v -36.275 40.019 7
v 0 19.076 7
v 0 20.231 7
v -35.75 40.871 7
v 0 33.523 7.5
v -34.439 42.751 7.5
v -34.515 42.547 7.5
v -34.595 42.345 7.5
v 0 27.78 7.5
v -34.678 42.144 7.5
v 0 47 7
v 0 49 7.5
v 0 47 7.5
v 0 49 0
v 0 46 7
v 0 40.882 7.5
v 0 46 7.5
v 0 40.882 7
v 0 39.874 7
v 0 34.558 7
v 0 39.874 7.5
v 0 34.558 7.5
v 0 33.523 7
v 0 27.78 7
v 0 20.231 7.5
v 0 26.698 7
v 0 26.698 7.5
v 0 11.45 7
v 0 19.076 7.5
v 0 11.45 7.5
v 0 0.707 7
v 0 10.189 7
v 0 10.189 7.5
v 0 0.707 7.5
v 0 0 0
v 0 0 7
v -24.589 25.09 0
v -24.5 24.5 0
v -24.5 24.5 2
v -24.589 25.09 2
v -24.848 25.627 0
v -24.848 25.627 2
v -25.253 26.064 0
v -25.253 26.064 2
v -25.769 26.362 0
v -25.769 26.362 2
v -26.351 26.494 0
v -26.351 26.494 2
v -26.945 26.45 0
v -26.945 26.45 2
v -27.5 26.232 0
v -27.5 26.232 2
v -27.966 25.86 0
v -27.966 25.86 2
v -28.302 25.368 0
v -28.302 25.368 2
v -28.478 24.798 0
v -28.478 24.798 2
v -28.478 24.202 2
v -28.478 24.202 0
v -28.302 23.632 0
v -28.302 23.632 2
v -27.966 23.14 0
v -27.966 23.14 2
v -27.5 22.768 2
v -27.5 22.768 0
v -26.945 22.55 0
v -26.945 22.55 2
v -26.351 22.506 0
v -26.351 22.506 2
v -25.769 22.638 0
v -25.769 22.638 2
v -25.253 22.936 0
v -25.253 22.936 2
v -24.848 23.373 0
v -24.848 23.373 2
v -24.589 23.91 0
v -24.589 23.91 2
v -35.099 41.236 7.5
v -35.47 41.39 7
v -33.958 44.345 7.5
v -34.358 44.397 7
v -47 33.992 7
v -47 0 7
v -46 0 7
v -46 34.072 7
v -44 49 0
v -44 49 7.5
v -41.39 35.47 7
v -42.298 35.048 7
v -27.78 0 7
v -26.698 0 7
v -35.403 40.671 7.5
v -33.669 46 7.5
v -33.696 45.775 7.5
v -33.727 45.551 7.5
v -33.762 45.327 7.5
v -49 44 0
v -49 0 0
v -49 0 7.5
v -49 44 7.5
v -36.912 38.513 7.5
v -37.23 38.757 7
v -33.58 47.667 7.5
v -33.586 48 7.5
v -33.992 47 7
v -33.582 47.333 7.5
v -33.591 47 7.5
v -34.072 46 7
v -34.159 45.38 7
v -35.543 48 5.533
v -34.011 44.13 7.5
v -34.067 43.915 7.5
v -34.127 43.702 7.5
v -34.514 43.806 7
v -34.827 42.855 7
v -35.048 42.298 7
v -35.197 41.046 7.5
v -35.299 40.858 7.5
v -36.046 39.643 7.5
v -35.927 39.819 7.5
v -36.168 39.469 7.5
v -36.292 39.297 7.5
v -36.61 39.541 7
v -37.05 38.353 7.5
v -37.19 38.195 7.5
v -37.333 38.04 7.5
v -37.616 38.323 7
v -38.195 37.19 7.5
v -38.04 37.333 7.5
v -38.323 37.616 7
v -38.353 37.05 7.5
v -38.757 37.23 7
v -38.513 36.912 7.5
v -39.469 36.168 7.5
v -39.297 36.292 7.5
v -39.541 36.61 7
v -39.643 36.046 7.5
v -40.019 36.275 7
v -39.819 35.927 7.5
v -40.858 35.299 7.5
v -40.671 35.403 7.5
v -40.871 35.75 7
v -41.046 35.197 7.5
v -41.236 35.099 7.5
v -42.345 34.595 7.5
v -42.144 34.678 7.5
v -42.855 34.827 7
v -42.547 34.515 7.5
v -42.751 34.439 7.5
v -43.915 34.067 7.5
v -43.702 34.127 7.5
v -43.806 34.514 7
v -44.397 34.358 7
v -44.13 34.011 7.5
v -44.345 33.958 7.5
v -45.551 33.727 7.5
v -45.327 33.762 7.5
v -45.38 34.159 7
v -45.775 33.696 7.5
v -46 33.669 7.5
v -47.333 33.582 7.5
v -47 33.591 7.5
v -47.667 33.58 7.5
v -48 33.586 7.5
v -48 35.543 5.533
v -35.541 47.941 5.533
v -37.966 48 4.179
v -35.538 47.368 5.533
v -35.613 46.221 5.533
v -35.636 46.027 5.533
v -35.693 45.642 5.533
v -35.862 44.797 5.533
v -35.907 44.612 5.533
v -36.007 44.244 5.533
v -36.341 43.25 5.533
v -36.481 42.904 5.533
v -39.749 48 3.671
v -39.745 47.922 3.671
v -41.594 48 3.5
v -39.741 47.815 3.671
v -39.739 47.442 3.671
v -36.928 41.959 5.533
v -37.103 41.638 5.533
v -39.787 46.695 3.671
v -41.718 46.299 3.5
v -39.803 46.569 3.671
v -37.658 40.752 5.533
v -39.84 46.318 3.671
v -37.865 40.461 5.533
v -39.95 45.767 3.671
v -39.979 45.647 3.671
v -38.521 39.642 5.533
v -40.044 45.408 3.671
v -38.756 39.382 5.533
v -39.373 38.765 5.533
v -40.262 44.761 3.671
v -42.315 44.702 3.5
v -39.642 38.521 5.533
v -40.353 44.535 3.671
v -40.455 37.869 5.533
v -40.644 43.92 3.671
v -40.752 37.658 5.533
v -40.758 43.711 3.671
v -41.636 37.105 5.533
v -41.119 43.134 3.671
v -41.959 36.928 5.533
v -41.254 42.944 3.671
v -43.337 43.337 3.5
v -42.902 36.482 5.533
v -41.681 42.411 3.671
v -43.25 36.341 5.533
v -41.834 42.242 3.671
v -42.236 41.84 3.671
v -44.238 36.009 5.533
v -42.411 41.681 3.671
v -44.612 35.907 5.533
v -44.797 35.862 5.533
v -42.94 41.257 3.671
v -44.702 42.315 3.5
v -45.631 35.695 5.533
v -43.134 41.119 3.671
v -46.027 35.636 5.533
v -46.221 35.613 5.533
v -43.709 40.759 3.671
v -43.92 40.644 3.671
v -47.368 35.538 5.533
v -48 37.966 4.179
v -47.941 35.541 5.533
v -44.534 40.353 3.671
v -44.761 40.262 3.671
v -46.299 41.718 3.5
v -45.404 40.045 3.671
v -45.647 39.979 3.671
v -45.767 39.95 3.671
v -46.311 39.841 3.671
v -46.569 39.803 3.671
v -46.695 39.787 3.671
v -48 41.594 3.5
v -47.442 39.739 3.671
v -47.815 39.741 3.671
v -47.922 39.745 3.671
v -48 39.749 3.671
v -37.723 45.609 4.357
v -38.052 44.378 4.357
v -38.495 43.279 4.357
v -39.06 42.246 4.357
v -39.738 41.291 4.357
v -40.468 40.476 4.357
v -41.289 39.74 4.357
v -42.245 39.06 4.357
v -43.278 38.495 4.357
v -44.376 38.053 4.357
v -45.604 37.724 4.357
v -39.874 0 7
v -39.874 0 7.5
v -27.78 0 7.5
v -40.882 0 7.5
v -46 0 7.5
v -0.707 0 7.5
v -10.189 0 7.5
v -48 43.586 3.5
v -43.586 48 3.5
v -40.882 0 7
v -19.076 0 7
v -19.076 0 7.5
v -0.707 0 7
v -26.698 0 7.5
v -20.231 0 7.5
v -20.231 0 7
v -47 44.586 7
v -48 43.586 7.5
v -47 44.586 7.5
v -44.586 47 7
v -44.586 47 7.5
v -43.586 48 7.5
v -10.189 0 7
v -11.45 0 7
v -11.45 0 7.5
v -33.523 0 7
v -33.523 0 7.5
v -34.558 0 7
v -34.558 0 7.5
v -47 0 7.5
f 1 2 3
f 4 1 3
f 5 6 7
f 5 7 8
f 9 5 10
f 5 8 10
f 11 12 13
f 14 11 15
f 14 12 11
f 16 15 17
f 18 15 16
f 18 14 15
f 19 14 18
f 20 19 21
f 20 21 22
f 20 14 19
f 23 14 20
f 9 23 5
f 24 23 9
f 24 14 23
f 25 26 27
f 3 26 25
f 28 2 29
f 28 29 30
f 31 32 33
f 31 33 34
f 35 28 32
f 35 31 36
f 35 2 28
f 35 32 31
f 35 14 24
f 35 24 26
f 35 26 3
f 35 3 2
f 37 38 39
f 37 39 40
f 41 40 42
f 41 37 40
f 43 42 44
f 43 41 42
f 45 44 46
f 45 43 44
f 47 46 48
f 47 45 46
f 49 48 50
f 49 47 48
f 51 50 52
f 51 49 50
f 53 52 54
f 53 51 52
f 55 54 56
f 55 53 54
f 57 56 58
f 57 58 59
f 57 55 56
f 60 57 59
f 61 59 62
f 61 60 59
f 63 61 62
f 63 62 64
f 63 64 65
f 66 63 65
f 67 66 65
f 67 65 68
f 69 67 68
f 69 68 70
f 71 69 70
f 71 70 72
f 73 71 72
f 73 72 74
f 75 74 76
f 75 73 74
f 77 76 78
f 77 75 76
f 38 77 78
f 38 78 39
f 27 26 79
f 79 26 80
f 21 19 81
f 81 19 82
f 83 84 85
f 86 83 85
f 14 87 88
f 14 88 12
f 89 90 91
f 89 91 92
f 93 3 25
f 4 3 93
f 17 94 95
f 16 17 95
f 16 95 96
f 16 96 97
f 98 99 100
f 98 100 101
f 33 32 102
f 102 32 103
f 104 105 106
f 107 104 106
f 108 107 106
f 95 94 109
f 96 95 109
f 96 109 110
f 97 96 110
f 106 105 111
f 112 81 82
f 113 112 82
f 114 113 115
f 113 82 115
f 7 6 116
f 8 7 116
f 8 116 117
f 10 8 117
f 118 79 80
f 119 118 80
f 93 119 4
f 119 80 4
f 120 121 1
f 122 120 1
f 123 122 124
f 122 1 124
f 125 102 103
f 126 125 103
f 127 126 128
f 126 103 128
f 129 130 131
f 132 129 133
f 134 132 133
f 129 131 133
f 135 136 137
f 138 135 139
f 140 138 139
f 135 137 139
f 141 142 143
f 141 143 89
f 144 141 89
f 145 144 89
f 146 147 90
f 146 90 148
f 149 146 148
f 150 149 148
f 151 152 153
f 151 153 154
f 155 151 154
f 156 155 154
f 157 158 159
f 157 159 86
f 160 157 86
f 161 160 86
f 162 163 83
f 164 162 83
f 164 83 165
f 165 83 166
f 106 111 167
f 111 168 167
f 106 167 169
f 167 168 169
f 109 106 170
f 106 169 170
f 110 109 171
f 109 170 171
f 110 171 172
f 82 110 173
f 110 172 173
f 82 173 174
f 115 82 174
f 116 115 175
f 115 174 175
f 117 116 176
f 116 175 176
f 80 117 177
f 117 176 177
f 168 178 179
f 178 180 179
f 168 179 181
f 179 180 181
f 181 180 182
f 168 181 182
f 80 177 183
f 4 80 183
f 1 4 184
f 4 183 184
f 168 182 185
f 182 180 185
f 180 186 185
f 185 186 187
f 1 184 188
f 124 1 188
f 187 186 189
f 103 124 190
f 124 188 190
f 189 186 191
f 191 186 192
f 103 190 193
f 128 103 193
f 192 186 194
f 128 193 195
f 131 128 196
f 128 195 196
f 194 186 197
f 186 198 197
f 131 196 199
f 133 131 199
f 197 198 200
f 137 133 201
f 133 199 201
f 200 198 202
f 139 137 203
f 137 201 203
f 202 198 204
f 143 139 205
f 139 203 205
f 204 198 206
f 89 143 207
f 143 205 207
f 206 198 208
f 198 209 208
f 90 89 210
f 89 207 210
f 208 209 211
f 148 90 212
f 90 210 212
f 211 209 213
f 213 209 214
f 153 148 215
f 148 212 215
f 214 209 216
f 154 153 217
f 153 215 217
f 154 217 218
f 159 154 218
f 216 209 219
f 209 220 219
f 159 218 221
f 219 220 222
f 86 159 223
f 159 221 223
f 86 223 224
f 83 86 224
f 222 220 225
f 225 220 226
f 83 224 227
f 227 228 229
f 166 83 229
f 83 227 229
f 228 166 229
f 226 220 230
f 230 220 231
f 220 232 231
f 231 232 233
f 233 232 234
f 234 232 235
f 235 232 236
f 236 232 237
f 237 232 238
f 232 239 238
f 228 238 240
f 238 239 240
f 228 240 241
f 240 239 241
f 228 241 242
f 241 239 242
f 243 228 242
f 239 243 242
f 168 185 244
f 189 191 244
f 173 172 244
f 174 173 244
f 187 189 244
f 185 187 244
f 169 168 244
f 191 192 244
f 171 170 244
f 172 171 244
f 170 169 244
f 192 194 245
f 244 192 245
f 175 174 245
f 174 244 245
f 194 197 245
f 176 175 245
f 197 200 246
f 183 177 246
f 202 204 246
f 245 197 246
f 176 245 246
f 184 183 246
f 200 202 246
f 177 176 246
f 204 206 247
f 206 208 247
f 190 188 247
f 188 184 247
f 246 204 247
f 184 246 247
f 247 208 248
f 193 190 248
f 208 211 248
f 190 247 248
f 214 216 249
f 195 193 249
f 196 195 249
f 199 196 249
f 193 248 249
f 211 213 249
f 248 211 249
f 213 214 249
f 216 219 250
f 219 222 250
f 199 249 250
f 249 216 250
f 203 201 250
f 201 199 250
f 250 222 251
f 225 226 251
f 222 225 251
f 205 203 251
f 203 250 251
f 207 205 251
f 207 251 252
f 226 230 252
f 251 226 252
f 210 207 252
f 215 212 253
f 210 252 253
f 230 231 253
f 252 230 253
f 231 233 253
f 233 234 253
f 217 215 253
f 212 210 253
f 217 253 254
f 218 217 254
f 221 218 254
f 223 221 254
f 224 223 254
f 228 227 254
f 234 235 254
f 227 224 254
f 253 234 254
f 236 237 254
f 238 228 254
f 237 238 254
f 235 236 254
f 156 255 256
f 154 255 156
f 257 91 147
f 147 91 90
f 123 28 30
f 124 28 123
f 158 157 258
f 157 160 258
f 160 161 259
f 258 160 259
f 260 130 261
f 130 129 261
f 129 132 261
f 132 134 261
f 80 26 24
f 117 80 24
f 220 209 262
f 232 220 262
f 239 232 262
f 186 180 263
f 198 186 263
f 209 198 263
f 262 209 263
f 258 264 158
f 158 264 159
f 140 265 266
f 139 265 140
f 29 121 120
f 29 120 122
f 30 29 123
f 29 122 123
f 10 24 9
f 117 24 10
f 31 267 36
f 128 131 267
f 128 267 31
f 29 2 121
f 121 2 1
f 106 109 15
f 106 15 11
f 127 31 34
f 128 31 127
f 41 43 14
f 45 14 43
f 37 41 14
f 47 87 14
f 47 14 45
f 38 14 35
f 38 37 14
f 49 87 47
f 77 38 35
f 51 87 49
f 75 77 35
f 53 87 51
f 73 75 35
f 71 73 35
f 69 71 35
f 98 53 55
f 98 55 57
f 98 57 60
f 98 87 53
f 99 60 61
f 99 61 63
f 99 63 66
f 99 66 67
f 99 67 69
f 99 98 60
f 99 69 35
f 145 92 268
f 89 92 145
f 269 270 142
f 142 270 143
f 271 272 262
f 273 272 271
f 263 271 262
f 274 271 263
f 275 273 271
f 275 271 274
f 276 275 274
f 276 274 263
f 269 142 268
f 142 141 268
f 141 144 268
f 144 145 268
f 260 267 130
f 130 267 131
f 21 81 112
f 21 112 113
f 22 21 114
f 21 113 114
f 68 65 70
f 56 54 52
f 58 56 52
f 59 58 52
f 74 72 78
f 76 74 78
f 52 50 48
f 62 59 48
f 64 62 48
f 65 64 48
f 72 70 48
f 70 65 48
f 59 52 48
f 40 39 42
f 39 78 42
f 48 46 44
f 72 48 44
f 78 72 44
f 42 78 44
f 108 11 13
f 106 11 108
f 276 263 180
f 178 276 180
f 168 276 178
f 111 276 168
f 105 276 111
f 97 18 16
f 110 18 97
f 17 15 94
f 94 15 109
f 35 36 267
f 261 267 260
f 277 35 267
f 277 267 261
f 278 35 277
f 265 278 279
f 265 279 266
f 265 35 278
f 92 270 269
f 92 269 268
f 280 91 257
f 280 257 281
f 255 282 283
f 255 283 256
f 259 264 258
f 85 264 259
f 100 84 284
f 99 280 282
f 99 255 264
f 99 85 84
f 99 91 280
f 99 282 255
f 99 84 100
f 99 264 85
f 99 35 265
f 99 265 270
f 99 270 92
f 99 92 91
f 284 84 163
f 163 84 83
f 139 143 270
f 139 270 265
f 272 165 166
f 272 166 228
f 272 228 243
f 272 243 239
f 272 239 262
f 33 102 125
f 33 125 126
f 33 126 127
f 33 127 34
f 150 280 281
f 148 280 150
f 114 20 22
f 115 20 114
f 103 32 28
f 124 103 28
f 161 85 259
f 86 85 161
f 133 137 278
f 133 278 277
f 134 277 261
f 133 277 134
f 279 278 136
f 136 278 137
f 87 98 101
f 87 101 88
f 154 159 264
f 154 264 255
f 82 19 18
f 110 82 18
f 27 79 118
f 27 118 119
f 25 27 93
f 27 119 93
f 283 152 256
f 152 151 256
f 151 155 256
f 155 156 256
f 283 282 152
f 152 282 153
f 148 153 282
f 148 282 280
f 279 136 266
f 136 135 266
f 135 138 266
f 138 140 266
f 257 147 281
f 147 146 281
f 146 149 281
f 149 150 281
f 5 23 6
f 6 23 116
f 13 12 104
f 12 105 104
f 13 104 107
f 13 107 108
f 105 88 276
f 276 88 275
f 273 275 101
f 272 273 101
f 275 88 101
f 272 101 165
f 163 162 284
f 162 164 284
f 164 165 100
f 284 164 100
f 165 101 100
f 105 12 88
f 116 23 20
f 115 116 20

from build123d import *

# Parameters (mm, degrees)
BOSS_EXTRUDE1_DEPTH     = 7.5
CUT_EXTRUDE1_DEPTH      = 4
FILLET1_R               = 10
CUT_EXTRUDE_THIN2_START = -0.5
SKETCH2_W               = 1
SKETCH2_H               = 80
CUT_EXTRUDE_THIN2_DEPTH = 71.201147767
CIRPATTERN1_COUNT       = 13
CIRPATTERN1_ANGLE       = 90
SKETCH5_R               = 2
CUT_EXTRUDE2_DEPTH      = 2


with BuildPart() as part:
    # Sketch1 → Boss-Extrude1 (new body)
    with BuildSketch(Plane(origin=(0, 0, 0), x_dir=(0, 1, 0), z_dir=(0, 0, 1))):
        Polygon((44, 49), (49, 44), (49, 0), (0, 0), (0, 49), align=None)
    extrude(amount=BOSS_EXTRUDE1_DEPTH)

    # Sketch4 → Cut-Extrude1 (cut)
    with BuildSketch(Plane.XY.offset(7.5)):
        with BuildLine():
            Line((-48, 33.585786438), (-48, 43.585786438))
            Line((-48, 43.585786438), (-43.585786438, 48))
            Line((-43.585786438, 48), (-33.585786438, 48))
            ThreePointArc((-33.585786438, 48), (-37.679974138, 37.679974138), (-48, 33.585786438))
        make_face()
    extrude(amount=-CUT_EXTRUDE1_DEPTH, mode=Mode.SUBTRACT)

    # Fillet1
    # the kernel refuses this fillet: 10 mm, written as the material it adds along each edge
    with BuildSketch(Plane(origin=(-47.579469074, 47.579469074, 3.5), x_dir=(0.11133254598892352, 0.9937832078494908, 0), z_dir=(-0.9937832078494908, 0.11133254598892352, 0))) as fillet1_piece_1_section:
        with BuildLine():
            CenterArc((6, -10), FILLET1_R, 36.869897646, 53.130102354)
            Line((6, 0), (6, 0.2))
            Line((6, 0.2), (14, 0.2))
            Line((14, 0.2), (14.2, 0))
            ThreePointArc((14.2, 0), (14.2, -2), (14.16, -3.88))
            Line((14.16, -3.88), (14, -4))
        make_face()
    fillet1_piece_1 = revolve(axis=Axis((-47.579469074, 47.579469074, 3.5), (0, 0, -1)), revolution_arc=257.215726598, mode=Mode.PRIVATE)
    fillet1_piece_1 = split(fillet1_piece_1, bisect_by=Plane(origin=(-48, 39.87908293, 4.608055209), z_dir=(1, 0, 0)), keep=Keep.TOP, mode=Mode.PRIVATE)
    fillet1_piece_1 = split(fillet1_piece_1, bisect_by=Plane(origin=(-39.879083288, 48, 4.608055209), z_dir=(0, -1, 0)), keep=Keep.TOP, mode=Mode.PRIVATE)
    add(fillet1_piece_1)

    # Sketch2 → Cut-Extrude-Thin2 (cut)
    with BuildSketch(Plane.XY.offset(7.5).offset(CUT_EXTRUDE_THIN2_START)):
        with Locations((-46.5, 4.585786438)):
            Rectangle(SKETCH2_W, SKETCH2_H)
    cut_extrude_thin2 = extrude(amount=CUT_EXTRUDE_THIN2_DEPTH, mode=Mode.SUBTRACT)

    # CirPattern1: Cut-Extrude-Thin2 ×13 about axis
    cirpattern1_axis = Axis((-46.5, 46.5, 0), (0, 0, 1))
    for i in range(1, CIRPATTERN1_COUNT):
        add(cut_extrude_thin2.rotate(cirpattern1_axis, i * CIRPATTERN1_ANGLE / (CIRPATTERN1_COUNT - 1)), mode=Mode.SUBTRACT)

    # Sketch5 → Cut-Extrude2 (cut)
    with BuildSketch(Plane(origin=(0, 0, 0), x_dir=(0, 1, 0), z_dir=(0, 0, 1))):
        with Locations(Location((24.5, 26.5, 0), (0, 0, 270))):
            Circle(SKETCH5_R)
    extrude(amount=CUT_EXTRUDE2_DEPTH, mode=Mode.SUBTRACT)


solid = part.part
